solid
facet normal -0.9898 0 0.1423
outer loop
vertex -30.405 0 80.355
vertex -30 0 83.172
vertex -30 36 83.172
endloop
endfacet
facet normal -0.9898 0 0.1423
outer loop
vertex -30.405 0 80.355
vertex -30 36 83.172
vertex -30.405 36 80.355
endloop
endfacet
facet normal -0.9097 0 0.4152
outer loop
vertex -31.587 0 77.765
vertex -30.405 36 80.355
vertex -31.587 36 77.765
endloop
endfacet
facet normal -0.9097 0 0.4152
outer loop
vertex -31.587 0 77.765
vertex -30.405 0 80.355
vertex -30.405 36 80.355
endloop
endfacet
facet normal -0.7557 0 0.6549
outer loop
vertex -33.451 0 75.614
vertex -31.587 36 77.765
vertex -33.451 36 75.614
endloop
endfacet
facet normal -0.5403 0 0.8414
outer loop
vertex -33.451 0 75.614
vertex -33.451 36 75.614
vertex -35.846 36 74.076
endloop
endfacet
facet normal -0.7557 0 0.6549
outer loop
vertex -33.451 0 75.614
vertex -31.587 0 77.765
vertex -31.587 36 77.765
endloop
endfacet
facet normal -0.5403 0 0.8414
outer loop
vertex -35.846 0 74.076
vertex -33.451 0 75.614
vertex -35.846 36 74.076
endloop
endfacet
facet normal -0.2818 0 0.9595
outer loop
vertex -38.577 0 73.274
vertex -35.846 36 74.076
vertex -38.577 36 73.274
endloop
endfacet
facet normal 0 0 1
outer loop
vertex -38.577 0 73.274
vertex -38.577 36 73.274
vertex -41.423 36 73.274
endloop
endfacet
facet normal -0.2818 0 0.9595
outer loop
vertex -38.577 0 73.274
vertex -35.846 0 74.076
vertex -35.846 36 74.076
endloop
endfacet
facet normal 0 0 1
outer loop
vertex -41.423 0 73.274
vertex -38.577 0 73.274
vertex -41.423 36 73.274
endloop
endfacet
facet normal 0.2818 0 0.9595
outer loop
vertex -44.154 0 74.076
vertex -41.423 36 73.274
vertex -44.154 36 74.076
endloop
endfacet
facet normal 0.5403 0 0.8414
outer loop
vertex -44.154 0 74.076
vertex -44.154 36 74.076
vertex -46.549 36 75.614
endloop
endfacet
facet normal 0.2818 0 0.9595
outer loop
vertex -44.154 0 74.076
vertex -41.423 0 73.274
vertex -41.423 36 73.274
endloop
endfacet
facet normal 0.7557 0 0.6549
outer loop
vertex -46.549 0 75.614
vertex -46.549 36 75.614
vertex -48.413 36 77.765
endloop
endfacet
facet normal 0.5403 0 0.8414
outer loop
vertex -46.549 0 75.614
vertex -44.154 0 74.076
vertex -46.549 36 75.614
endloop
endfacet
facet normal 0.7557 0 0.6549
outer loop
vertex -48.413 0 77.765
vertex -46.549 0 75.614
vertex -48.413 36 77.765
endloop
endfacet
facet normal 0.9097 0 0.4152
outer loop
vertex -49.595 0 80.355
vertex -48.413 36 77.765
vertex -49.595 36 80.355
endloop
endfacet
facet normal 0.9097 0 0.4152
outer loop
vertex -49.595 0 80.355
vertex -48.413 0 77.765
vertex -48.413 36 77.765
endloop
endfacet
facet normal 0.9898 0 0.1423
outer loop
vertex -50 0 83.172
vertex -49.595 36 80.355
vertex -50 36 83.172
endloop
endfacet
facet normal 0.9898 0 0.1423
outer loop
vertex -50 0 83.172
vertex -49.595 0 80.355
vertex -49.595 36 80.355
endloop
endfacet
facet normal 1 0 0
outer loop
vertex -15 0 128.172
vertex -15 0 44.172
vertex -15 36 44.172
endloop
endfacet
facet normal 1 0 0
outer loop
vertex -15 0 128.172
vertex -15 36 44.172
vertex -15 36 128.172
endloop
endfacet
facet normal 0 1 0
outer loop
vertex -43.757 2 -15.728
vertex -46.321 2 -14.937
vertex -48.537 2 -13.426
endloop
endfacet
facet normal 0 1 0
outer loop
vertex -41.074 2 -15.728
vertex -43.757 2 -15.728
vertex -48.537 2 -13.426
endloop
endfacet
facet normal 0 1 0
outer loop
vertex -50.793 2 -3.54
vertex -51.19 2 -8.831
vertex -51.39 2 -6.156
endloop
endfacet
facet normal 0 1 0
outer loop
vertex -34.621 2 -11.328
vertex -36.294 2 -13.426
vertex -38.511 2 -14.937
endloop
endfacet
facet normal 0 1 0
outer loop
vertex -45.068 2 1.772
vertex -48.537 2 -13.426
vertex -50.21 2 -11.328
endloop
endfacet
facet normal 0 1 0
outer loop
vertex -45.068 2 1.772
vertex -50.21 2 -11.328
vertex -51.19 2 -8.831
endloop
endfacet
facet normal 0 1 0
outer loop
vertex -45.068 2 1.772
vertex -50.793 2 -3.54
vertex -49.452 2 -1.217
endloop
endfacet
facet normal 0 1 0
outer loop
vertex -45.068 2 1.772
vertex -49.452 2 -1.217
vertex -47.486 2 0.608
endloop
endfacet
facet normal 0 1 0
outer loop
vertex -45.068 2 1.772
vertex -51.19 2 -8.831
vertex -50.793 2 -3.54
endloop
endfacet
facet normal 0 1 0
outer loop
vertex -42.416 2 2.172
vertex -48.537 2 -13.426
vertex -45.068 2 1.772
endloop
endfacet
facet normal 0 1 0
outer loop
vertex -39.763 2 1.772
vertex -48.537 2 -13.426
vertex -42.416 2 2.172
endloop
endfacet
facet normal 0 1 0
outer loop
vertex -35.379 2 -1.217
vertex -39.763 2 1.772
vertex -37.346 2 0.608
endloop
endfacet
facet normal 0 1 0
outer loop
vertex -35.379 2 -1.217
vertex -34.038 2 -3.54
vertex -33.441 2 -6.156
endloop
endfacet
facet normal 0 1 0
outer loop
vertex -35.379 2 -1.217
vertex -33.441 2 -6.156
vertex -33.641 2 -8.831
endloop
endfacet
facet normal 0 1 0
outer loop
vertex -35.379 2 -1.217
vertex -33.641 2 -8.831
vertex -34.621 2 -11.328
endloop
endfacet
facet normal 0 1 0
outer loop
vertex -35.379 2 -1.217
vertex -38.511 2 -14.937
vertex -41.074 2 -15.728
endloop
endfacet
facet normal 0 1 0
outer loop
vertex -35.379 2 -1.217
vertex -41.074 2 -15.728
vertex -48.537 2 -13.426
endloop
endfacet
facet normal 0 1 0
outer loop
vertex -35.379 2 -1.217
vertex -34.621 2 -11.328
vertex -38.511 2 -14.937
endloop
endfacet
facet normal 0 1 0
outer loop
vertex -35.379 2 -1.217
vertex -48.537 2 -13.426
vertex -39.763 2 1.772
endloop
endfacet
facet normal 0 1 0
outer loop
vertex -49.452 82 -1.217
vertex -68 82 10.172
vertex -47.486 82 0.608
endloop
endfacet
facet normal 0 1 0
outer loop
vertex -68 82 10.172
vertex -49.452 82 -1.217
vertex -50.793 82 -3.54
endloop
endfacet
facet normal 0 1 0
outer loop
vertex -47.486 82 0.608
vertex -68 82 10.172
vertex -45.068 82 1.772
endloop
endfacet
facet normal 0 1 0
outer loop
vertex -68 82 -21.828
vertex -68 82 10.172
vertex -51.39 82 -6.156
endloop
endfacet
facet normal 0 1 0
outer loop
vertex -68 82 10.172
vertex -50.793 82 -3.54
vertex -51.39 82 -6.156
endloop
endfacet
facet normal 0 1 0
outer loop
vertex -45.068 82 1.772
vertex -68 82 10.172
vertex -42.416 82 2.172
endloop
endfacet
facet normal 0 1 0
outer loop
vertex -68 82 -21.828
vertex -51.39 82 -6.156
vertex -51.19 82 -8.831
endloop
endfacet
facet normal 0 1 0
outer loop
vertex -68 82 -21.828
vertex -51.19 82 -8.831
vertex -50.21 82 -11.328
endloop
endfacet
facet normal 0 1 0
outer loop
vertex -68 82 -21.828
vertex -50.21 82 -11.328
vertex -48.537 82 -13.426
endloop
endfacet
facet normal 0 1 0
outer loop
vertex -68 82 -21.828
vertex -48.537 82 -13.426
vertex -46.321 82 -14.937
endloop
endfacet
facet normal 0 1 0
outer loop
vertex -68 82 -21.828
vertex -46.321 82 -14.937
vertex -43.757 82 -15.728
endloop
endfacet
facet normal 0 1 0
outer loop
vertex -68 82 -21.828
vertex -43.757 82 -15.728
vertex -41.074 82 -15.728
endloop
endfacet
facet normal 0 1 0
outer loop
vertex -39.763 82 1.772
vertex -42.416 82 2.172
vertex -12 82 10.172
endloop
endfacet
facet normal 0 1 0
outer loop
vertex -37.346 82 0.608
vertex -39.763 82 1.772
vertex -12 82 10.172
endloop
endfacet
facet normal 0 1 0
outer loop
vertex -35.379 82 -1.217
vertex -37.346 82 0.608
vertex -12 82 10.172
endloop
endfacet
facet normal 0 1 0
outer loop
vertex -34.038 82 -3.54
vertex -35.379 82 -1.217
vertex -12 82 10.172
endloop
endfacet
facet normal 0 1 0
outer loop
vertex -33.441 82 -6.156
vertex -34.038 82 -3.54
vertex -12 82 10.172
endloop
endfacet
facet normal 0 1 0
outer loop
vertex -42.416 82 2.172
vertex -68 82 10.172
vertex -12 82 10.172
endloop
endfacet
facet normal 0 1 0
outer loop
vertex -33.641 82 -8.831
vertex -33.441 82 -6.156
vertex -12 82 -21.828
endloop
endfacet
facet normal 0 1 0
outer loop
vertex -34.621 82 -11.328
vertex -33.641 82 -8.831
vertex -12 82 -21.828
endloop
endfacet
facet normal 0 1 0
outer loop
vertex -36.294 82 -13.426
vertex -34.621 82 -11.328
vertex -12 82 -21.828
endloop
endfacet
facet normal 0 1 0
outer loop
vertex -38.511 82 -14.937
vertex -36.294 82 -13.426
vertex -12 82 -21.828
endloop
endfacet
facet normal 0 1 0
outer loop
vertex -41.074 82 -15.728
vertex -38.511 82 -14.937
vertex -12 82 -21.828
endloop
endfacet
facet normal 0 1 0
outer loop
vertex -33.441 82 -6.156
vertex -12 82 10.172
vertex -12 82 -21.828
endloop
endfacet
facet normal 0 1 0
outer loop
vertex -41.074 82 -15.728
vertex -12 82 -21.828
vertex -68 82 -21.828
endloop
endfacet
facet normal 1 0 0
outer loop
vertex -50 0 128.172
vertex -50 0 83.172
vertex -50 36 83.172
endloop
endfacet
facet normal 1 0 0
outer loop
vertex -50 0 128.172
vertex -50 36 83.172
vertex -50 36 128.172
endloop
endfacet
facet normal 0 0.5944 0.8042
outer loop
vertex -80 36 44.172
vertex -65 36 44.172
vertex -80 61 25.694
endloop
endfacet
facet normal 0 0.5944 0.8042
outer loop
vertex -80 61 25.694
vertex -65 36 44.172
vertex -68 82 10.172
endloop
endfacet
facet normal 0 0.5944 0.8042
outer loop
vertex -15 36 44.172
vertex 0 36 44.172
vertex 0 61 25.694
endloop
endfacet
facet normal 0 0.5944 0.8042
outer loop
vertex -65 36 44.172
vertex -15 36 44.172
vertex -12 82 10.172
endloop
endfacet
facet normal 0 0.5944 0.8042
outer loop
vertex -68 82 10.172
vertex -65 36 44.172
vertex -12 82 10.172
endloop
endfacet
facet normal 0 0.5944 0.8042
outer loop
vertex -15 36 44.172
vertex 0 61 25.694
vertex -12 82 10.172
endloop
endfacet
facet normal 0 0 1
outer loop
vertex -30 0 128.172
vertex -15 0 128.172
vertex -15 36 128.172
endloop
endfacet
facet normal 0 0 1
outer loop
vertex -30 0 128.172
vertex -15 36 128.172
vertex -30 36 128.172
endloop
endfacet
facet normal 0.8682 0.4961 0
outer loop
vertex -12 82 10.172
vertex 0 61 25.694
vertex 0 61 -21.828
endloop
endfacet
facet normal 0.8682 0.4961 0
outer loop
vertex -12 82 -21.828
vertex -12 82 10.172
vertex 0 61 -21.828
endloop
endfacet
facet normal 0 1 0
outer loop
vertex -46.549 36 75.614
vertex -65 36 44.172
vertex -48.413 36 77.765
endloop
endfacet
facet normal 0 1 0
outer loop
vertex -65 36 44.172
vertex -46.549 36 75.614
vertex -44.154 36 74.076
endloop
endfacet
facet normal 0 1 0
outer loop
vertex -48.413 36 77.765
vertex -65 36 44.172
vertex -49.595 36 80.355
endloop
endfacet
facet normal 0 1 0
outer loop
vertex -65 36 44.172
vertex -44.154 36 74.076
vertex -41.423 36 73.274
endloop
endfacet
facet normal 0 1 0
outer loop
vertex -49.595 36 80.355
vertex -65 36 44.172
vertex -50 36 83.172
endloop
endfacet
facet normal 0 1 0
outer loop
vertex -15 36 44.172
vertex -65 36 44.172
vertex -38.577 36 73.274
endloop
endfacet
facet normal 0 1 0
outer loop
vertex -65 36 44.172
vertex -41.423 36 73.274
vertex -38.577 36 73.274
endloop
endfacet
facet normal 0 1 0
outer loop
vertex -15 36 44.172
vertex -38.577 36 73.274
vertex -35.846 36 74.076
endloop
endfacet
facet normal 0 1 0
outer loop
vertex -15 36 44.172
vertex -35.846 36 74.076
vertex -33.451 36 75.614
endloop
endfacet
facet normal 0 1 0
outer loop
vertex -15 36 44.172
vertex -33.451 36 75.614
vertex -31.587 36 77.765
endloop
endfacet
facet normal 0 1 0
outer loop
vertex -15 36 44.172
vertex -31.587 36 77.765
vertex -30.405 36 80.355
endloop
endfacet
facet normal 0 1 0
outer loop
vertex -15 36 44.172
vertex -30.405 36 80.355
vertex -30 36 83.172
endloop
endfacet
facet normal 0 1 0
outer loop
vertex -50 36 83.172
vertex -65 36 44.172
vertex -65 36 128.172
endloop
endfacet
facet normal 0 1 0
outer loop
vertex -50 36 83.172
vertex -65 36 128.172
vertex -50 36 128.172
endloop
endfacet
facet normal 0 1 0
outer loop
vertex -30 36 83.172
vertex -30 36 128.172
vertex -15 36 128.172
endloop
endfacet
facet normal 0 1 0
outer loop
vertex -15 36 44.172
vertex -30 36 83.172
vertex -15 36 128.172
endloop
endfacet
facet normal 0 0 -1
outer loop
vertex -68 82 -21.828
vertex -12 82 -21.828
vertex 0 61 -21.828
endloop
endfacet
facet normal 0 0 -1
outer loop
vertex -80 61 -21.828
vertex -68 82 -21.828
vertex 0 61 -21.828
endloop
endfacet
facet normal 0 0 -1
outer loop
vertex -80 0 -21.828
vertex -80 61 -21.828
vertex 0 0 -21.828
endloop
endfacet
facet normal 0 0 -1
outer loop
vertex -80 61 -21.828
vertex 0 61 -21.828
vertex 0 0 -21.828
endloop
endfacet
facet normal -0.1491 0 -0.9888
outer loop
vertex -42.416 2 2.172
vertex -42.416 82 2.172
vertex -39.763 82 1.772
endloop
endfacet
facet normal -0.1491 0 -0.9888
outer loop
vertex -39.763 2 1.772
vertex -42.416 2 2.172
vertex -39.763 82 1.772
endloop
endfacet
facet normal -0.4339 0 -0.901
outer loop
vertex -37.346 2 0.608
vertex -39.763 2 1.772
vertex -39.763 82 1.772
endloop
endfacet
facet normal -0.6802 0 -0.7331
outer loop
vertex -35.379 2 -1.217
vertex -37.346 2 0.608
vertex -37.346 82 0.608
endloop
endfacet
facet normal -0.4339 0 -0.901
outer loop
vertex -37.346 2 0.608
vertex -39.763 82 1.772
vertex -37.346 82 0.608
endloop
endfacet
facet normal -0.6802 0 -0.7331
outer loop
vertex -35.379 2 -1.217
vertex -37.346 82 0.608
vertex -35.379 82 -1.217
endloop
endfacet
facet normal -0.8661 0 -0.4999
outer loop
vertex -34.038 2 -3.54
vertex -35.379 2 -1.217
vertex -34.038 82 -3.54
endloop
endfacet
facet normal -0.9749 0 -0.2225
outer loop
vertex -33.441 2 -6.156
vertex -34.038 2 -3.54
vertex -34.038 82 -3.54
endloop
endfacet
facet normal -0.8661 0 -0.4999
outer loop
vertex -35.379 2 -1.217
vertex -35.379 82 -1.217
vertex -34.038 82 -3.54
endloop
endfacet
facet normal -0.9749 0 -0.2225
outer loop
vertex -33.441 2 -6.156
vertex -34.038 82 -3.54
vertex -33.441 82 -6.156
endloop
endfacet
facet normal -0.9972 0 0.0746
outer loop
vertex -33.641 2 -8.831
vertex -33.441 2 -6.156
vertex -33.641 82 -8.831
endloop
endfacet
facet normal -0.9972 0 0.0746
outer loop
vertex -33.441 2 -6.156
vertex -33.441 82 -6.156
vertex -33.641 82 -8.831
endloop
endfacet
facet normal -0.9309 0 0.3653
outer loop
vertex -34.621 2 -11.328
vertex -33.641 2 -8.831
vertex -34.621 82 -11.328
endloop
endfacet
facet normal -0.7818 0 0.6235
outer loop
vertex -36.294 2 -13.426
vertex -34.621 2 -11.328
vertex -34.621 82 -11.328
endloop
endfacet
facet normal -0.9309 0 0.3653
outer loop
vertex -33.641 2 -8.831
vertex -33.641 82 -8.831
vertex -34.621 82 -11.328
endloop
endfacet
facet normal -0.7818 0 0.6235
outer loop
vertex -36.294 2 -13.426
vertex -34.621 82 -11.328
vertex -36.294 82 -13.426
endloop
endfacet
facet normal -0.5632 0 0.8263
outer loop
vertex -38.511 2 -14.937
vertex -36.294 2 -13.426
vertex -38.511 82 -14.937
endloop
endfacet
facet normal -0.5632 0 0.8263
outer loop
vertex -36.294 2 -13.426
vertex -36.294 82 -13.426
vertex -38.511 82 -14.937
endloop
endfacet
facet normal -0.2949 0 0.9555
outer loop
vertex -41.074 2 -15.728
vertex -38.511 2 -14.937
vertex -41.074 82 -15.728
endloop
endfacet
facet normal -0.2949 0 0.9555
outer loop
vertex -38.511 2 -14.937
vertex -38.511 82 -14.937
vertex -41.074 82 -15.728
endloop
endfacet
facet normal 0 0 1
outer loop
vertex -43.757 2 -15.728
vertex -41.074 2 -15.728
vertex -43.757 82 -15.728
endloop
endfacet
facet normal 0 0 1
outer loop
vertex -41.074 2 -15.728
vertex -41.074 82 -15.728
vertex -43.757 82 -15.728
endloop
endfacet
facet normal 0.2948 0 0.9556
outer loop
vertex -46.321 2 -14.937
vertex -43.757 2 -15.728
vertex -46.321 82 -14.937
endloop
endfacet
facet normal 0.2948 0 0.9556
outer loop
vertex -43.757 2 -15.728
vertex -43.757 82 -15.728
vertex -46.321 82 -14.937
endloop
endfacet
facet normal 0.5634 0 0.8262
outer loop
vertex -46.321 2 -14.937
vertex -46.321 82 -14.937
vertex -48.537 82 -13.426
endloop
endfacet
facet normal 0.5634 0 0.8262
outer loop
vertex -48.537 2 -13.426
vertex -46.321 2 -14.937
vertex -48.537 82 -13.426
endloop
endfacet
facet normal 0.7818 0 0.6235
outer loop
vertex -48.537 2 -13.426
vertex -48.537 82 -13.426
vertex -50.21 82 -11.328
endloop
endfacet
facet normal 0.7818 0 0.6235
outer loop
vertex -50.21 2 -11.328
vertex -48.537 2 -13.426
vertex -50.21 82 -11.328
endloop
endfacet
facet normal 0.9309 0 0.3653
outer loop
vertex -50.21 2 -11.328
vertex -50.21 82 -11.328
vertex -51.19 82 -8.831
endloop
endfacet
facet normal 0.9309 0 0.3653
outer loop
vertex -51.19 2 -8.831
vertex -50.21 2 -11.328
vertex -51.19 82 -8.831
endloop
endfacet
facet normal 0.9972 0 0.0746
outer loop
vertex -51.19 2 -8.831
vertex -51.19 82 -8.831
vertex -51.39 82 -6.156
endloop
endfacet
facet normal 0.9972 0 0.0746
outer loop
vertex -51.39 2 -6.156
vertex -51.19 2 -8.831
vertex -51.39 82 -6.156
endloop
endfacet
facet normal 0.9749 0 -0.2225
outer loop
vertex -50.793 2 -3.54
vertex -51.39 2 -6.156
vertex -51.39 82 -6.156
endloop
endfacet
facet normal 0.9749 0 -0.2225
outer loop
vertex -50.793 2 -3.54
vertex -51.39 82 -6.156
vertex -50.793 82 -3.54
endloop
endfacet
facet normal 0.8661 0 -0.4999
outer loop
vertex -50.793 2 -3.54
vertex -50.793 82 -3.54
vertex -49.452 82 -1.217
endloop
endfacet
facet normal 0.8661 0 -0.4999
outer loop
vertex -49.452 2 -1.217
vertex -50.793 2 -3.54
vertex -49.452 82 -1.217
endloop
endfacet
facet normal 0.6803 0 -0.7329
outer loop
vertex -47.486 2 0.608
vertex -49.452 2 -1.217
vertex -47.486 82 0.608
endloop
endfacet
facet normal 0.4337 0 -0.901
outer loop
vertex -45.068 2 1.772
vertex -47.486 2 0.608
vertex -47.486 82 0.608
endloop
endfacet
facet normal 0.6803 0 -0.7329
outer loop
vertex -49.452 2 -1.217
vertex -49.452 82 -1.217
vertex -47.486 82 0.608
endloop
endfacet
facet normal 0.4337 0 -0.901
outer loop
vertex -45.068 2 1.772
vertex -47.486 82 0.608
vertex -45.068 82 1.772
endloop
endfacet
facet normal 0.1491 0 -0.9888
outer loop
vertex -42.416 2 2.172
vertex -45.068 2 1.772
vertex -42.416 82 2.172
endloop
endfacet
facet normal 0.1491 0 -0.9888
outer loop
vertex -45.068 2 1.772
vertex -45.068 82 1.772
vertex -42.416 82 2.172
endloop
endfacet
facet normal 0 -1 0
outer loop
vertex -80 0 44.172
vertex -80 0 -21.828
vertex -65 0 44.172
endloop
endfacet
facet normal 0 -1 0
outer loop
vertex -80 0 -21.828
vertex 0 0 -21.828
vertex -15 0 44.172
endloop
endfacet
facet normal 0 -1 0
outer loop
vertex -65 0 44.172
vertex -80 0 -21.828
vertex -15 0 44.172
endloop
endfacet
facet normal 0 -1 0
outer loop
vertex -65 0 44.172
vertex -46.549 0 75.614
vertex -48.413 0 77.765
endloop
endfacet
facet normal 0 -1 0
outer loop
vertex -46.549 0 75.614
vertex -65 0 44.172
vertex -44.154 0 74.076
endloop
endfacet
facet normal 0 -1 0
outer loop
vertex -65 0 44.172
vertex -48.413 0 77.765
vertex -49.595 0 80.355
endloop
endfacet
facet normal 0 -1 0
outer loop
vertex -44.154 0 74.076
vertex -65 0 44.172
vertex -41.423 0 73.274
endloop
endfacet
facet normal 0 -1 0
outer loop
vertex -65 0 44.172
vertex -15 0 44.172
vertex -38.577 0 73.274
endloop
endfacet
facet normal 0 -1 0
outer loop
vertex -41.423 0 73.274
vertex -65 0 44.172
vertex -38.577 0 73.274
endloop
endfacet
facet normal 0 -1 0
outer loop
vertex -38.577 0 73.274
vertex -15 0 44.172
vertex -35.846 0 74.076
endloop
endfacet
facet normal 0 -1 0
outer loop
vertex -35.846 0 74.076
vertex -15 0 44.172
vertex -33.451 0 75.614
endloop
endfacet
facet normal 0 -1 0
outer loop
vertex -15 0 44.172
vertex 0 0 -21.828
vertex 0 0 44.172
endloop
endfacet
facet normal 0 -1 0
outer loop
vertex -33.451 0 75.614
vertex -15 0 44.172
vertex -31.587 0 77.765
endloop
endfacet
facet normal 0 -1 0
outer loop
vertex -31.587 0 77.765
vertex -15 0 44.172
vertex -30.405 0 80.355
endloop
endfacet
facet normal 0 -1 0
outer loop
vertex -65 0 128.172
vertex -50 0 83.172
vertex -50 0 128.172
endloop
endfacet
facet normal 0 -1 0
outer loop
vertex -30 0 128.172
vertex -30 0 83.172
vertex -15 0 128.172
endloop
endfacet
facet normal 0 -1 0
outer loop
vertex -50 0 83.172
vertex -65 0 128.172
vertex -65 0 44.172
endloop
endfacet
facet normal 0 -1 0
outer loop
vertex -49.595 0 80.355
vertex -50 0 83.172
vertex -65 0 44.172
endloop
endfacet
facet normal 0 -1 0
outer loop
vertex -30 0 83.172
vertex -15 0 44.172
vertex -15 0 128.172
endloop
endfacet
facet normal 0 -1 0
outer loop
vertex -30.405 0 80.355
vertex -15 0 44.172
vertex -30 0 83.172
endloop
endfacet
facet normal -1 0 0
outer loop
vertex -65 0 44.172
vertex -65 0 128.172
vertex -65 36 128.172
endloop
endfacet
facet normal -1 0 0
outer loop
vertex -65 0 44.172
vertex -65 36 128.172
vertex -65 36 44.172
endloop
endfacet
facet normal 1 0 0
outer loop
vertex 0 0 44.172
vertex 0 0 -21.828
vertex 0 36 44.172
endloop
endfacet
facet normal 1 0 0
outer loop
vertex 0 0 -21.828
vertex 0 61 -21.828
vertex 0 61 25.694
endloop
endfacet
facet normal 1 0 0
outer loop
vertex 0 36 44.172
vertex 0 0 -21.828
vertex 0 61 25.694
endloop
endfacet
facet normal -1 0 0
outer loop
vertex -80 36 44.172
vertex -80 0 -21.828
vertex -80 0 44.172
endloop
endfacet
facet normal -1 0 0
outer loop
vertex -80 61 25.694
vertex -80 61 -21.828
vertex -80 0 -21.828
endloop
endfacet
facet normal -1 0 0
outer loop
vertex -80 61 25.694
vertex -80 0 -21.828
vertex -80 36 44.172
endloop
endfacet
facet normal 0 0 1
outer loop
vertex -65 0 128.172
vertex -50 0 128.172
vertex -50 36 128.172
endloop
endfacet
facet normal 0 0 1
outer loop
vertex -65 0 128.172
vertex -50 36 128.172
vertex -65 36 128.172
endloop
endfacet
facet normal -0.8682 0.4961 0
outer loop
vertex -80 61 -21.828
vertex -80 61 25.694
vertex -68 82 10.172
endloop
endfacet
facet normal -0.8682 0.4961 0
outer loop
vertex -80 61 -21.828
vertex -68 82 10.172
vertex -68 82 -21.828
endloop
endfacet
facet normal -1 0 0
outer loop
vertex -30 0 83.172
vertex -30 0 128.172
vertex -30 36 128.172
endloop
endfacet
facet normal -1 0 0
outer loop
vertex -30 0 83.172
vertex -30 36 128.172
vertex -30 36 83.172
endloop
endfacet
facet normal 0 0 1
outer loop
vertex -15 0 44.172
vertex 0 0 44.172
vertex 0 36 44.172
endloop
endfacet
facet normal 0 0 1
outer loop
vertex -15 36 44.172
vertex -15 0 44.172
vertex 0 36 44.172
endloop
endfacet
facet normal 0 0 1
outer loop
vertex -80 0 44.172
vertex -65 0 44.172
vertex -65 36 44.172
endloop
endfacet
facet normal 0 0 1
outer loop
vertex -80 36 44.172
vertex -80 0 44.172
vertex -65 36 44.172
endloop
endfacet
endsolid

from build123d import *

# Parameters (mm, degrees)
BOSS_EXTRUDE1_DEPTH = 80
CHAMFER1_SIZE       = 12
CHAMFER1_SIZE2      = 21
CHAMFER2_SIZE       = 12
CHAMFER2_SIZE2      = 21
SKETCH2_R           = 9
CUT_EXTRUDE1_DEPTH  = 80
BOSS_EXTRUDE2_DEPTH = 36


with BuildPart() as part:
    # Sketch1 → Boss-Extrude1 (new body)
    with BuildSketch(Plane(origin=(0, 0, 0), x_dir=(0, 0, -1), z_dir=(1, 0, 0))):
        Polygon((-44.171875, 0), (-44.171875, 36), (-10.171875, 82), (21.828125, 82), (21.828125, 0), align=None)
    extrude(amount=-BOSS_EXTRUDE1_DEPTH)

    # Chamfer1
    chamfer1_edges = [part.edges().sort_by_distance(p)[0] for p in [
        (0, 82, -5.828125),
    ]]
    chamfer1_side = [part.faces().sort_by_distance(p)[0] for p in [
        (-40, 82, -5.828125),
    ]]
    chamfer(chamfer1_edges, length=CHAMFER1_SIZE, length2=CHAMFER1_SIZE2, reference=chamfer1_side[0])

    # Chamfer2
    chamfer2_edges = [part.edges().sort_by_distance(p)[0] for p in [
        (-80, 82, -5.828125),
    ]]
    chamfer2_side = [part.faces().sort_by_distance(p)[0] for p in [
        (-46, 82, -5.828125),
    ]]
    chamfer(chamfer2_edges, length=CHAMFER2_SIZE, length2=CHAMFER2_SIZE2, reference=chamfer2_side[0])

    # Sketch2 → Cut-Extrude1 (cut)
    with BuildSketch(Plane(origin=(0, 82, 0), x_dir=(1, 0, 0), z_dir=(0, 1, 0))):
        with Locations(Location((-42.415623136, 6.828125, 0), (0, 0, 270))):
            Circle(SKETCH2_R)
    extrude(amount=-CUT_EXTRUDE1_DEPTH, mode=Mode.SUBTRACT)

    # Sketch3 → Boss-Extrude2 (add)
    with BuildSketch(Plane.XZ):
        with BuildLine():
            Line((-65, 128.171875), (-65, 44.171875))
            Line((-65, 44.171875), (-15, 44.171875))
            Line((-15, 44.171875), (-15, 128.171875))
            Line((-15, 128.171875), (-30, 128.171875))
            Line((-30, 128.171875), (-30, 83.171875))
            ThreePointArc((-30, 83.171875), (-40, 73.171875), (-50, 83.171875))
            Line((-50, 83.171875), (-50, 128.171875))
            Line((-50, 128.171875), (-65, 128.171875))
        make_face()
    extrude(amount=-BOSS_EXTRUDE2_DEPTH)


solid = part.part
